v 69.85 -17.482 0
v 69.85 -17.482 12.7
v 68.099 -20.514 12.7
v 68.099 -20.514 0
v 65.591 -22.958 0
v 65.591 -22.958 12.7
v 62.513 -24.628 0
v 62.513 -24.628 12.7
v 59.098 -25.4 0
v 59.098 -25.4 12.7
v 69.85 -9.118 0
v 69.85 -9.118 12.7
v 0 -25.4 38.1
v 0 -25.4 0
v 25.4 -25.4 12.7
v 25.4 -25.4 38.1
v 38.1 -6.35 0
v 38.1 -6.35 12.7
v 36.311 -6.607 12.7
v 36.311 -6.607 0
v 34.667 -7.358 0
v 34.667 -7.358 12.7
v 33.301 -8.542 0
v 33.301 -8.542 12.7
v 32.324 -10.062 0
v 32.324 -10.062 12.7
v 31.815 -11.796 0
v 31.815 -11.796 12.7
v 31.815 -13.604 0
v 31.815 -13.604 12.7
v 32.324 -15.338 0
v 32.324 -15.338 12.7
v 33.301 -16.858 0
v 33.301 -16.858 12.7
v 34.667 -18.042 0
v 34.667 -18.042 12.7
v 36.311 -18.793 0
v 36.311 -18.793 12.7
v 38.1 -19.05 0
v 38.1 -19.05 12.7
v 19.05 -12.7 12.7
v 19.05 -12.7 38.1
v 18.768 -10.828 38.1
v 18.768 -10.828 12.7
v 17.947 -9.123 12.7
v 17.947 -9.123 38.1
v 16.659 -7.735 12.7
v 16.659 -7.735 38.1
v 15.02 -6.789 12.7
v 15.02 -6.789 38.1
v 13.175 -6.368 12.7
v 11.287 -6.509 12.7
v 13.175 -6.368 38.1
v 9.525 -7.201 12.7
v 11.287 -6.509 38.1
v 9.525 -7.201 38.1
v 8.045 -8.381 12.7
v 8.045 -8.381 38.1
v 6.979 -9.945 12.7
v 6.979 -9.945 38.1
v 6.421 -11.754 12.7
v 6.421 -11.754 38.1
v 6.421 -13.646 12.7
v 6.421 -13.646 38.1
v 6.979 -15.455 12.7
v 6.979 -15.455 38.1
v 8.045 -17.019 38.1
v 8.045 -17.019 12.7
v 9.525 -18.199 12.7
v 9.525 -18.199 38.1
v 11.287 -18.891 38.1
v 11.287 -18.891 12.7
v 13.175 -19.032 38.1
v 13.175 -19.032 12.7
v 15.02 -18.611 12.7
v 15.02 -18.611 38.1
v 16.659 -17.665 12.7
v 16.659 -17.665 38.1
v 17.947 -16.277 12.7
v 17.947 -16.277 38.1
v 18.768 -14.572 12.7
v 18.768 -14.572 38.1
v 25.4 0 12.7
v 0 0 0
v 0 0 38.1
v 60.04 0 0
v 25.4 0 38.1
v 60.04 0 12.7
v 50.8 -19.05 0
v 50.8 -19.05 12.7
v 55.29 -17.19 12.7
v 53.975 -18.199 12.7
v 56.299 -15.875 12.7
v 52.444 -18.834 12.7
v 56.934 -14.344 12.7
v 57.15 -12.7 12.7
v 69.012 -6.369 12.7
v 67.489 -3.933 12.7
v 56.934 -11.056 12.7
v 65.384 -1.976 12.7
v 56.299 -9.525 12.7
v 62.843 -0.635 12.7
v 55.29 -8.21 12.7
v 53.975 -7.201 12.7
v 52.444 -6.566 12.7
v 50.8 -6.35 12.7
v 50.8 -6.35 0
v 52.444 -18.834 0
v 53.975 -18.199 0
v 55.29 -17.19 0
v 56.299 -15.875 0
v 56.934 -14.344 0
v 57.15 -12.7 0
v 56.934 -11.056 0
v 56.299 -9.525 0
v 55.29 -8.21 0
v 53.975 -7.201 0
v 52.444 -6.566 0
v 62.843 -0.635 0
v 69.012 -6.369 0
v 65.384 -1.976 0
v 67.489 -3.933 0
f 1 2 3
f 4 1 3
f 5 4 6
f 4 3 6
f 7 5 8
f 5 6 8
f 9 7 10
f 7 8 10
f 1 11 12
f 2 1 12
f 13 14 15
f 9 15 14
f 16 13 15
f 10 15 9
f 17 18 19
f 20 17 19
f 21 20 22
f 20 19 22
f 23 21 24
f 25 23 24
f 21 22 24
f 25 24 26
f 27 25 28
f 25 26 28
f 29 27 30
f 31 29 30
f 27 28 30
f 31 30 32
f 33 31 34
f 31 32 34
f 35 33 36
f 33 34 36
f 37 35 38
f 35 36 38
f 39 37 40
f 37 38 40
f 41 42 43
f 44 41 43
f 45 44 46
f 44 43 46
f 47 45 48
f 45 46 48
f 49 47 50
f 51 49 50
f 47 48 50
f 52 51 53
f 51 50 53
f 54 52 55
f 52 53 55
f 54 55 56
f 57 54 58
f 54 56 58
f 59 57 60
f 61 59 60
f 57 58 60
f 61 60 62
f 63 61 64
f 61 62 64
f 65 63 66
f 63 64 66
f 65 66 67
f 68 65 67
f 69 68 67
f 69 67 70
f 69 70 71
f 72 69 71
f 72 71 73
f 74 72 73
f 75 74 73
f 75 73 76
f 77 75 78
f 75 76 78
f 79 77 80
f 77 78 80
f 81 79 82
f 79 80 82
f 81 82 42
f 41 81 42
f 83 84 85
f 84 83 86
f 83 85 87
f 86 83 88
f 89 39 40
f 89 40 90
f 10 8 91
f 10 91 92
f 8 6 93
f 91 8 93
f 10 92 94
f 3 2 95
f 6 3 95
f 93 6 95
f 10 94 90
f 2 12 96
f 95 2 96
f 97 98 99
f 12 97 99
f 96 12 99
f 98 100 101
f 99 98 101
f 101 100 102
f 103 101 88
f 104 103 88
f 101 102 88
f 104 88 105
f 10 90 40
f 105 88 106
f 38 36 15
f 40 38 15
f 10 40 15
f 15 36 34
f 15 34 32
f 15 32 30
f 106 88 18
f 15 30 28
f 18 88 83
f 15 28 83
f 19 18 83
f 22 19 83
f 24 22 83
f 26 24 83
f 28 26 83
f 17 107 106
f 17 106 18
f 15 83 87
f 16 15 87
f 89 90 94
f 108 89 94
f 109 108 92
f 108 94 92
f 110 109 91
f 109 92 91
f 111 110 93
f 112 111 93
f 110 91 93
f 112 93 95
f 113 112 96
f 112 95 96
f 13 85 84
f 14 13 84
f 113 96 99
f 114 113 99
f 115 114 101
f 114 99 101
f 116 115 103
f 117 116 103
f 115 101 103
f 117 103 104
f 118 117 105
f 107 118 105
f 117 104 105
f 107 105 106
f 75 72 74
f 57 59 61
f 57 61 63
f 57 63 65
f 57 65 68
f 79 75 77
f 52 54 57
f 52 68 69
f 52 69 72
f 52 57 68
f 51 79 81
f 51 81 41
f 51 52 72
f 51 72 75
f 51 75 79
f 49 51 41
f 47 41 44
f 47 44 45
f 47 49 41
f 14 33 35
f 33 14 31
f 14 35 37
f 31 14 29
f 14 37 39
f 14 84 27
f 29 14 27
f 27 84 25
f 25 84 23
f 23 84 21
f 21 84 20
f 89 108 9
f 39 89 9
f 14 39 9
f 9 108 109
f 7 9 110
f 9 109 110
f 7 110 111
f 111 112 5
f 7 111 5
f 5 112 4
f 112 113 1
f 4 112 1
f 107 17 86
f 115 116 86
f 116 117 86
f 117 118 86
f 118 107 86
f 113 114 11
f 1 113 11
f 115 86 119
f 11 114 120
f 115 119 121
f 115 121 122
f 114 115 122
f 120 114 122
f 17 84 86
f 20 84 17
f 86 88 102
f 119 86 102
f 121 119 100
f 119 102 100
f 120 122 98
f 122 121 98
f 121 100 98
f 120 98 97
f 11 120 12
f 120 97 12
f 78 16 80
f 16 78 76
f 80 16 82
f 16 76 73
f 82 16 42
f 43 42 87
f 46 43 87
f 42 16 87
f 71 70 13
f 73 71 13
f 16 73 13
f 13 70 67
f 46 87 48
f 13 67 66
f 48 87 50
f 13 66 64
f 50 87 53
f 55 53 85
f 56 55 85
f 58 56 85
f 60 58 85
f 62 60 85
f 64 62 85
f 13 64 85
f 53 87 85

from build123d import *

# Parameters (mm, degrees)
F1_DEPTH = 25.4
F3_DEPTH = 25.4
F4_R     = 6.35
F5_DEPTH = 25.4
F7_DEPTH = 25.4


with BuildPart() as f1:
    # F0 (on Front) → F1 (new body)
    with BuildSketch(Plane.XZ):
        Polygon((0, 38.1), (0, 0), (69.85, 0), (69.85, 12.7), (25.4, 12.7), (25.4, 38.1), align=None)
    extrude(amount=F1_DEPTH)

    # F2 (on face) → F3 (cut)
    with BuildSketch(Plane.XY.offset(12.7)):
        with BuildLine():
            ThreePointArc((60.03999, 0), (66.500733, -2.88518), (69.85, -9.117986))
            Line((69.85, -9.117986), (69.85, 0))
            Line((69.85, 0), (60.03999, 0))
        make_face()
        with BuildLine():
            Line((69.85, -25.4), (69.85, -17.481705))
            ThreePointArc((69.85, -17.481705), (65.590949, -22.957802), (59.097659, -25.4))
            Line((59.097659, -25.4), (69.85, -25.4))
        make_face()
    extrude(amount=-F3_DEPTH, mode=Mode.SUBTRACT)

    # F4 (on face) → F5 (cut)
    with BuildSketch(Plane.XY.offset(38.1)):
        with Locations((12.7, -12.7)):
            Circle(F4_R)
    extrude(amount=-F5_DEPTH, mode=Mode.SUBTRACT)

    # F6 (on face) → F7 (cut)
    with BuildSketch(Plane.XY.offset(12.7)):
        with BuildLine():
            ThreePointArc((38.1, -19.05), (42.590128, -17.190128), (44.45, -12.7))
            ThreePointArc((44.45, -12.7), (42.590128, -8.209872), (38.1, -6.35))
            ThreePointArc((38.1, -6.35), (31.75, -12.7), (38.1, -19.05))
        make_face()
        with BuildLine():
            ThreePointArc((50.8, -6.35), (46.309872, -8.209872), (44.45, -12.7))
            ThreePointArc((44.45, -12.7), (46.309872, -17.190128), (50.8, -19.05))
            ThreePointArc((50.8, -19.05), (55.290128, -17.190128), (57.15, -12.7))
            ThreePointArc((57.15, -12.7), (55.290128, -8.209872), (50.8, -6.35))
        make_face()
        with BuildLine():
            ThreePointArc((50.8, -19.05), (46.309872, -17.190128), (44.45, -12.7))
            ThreePointArc((44.45, -12.7), (42.590128, -17.190128), (38.1, -19.05))
            Line((38.1, -19.05), (50.8, -19.05))
        make_face()
        with BuildLine():
            ThreePointArc((38.1, -6.35), (42.590128, -8.209872), (44.45, -12.7))
            ThreePointArc((44.45, -12.7), (46.309872, -8.209872), (50.8, -6.35))
            Line((50.8, -6.35), (38.1, -6.35))
        make_face()
    extrude(amount=-F7_DEPTH, mode=Mode.SUBTRACT)


solid = f1.part
